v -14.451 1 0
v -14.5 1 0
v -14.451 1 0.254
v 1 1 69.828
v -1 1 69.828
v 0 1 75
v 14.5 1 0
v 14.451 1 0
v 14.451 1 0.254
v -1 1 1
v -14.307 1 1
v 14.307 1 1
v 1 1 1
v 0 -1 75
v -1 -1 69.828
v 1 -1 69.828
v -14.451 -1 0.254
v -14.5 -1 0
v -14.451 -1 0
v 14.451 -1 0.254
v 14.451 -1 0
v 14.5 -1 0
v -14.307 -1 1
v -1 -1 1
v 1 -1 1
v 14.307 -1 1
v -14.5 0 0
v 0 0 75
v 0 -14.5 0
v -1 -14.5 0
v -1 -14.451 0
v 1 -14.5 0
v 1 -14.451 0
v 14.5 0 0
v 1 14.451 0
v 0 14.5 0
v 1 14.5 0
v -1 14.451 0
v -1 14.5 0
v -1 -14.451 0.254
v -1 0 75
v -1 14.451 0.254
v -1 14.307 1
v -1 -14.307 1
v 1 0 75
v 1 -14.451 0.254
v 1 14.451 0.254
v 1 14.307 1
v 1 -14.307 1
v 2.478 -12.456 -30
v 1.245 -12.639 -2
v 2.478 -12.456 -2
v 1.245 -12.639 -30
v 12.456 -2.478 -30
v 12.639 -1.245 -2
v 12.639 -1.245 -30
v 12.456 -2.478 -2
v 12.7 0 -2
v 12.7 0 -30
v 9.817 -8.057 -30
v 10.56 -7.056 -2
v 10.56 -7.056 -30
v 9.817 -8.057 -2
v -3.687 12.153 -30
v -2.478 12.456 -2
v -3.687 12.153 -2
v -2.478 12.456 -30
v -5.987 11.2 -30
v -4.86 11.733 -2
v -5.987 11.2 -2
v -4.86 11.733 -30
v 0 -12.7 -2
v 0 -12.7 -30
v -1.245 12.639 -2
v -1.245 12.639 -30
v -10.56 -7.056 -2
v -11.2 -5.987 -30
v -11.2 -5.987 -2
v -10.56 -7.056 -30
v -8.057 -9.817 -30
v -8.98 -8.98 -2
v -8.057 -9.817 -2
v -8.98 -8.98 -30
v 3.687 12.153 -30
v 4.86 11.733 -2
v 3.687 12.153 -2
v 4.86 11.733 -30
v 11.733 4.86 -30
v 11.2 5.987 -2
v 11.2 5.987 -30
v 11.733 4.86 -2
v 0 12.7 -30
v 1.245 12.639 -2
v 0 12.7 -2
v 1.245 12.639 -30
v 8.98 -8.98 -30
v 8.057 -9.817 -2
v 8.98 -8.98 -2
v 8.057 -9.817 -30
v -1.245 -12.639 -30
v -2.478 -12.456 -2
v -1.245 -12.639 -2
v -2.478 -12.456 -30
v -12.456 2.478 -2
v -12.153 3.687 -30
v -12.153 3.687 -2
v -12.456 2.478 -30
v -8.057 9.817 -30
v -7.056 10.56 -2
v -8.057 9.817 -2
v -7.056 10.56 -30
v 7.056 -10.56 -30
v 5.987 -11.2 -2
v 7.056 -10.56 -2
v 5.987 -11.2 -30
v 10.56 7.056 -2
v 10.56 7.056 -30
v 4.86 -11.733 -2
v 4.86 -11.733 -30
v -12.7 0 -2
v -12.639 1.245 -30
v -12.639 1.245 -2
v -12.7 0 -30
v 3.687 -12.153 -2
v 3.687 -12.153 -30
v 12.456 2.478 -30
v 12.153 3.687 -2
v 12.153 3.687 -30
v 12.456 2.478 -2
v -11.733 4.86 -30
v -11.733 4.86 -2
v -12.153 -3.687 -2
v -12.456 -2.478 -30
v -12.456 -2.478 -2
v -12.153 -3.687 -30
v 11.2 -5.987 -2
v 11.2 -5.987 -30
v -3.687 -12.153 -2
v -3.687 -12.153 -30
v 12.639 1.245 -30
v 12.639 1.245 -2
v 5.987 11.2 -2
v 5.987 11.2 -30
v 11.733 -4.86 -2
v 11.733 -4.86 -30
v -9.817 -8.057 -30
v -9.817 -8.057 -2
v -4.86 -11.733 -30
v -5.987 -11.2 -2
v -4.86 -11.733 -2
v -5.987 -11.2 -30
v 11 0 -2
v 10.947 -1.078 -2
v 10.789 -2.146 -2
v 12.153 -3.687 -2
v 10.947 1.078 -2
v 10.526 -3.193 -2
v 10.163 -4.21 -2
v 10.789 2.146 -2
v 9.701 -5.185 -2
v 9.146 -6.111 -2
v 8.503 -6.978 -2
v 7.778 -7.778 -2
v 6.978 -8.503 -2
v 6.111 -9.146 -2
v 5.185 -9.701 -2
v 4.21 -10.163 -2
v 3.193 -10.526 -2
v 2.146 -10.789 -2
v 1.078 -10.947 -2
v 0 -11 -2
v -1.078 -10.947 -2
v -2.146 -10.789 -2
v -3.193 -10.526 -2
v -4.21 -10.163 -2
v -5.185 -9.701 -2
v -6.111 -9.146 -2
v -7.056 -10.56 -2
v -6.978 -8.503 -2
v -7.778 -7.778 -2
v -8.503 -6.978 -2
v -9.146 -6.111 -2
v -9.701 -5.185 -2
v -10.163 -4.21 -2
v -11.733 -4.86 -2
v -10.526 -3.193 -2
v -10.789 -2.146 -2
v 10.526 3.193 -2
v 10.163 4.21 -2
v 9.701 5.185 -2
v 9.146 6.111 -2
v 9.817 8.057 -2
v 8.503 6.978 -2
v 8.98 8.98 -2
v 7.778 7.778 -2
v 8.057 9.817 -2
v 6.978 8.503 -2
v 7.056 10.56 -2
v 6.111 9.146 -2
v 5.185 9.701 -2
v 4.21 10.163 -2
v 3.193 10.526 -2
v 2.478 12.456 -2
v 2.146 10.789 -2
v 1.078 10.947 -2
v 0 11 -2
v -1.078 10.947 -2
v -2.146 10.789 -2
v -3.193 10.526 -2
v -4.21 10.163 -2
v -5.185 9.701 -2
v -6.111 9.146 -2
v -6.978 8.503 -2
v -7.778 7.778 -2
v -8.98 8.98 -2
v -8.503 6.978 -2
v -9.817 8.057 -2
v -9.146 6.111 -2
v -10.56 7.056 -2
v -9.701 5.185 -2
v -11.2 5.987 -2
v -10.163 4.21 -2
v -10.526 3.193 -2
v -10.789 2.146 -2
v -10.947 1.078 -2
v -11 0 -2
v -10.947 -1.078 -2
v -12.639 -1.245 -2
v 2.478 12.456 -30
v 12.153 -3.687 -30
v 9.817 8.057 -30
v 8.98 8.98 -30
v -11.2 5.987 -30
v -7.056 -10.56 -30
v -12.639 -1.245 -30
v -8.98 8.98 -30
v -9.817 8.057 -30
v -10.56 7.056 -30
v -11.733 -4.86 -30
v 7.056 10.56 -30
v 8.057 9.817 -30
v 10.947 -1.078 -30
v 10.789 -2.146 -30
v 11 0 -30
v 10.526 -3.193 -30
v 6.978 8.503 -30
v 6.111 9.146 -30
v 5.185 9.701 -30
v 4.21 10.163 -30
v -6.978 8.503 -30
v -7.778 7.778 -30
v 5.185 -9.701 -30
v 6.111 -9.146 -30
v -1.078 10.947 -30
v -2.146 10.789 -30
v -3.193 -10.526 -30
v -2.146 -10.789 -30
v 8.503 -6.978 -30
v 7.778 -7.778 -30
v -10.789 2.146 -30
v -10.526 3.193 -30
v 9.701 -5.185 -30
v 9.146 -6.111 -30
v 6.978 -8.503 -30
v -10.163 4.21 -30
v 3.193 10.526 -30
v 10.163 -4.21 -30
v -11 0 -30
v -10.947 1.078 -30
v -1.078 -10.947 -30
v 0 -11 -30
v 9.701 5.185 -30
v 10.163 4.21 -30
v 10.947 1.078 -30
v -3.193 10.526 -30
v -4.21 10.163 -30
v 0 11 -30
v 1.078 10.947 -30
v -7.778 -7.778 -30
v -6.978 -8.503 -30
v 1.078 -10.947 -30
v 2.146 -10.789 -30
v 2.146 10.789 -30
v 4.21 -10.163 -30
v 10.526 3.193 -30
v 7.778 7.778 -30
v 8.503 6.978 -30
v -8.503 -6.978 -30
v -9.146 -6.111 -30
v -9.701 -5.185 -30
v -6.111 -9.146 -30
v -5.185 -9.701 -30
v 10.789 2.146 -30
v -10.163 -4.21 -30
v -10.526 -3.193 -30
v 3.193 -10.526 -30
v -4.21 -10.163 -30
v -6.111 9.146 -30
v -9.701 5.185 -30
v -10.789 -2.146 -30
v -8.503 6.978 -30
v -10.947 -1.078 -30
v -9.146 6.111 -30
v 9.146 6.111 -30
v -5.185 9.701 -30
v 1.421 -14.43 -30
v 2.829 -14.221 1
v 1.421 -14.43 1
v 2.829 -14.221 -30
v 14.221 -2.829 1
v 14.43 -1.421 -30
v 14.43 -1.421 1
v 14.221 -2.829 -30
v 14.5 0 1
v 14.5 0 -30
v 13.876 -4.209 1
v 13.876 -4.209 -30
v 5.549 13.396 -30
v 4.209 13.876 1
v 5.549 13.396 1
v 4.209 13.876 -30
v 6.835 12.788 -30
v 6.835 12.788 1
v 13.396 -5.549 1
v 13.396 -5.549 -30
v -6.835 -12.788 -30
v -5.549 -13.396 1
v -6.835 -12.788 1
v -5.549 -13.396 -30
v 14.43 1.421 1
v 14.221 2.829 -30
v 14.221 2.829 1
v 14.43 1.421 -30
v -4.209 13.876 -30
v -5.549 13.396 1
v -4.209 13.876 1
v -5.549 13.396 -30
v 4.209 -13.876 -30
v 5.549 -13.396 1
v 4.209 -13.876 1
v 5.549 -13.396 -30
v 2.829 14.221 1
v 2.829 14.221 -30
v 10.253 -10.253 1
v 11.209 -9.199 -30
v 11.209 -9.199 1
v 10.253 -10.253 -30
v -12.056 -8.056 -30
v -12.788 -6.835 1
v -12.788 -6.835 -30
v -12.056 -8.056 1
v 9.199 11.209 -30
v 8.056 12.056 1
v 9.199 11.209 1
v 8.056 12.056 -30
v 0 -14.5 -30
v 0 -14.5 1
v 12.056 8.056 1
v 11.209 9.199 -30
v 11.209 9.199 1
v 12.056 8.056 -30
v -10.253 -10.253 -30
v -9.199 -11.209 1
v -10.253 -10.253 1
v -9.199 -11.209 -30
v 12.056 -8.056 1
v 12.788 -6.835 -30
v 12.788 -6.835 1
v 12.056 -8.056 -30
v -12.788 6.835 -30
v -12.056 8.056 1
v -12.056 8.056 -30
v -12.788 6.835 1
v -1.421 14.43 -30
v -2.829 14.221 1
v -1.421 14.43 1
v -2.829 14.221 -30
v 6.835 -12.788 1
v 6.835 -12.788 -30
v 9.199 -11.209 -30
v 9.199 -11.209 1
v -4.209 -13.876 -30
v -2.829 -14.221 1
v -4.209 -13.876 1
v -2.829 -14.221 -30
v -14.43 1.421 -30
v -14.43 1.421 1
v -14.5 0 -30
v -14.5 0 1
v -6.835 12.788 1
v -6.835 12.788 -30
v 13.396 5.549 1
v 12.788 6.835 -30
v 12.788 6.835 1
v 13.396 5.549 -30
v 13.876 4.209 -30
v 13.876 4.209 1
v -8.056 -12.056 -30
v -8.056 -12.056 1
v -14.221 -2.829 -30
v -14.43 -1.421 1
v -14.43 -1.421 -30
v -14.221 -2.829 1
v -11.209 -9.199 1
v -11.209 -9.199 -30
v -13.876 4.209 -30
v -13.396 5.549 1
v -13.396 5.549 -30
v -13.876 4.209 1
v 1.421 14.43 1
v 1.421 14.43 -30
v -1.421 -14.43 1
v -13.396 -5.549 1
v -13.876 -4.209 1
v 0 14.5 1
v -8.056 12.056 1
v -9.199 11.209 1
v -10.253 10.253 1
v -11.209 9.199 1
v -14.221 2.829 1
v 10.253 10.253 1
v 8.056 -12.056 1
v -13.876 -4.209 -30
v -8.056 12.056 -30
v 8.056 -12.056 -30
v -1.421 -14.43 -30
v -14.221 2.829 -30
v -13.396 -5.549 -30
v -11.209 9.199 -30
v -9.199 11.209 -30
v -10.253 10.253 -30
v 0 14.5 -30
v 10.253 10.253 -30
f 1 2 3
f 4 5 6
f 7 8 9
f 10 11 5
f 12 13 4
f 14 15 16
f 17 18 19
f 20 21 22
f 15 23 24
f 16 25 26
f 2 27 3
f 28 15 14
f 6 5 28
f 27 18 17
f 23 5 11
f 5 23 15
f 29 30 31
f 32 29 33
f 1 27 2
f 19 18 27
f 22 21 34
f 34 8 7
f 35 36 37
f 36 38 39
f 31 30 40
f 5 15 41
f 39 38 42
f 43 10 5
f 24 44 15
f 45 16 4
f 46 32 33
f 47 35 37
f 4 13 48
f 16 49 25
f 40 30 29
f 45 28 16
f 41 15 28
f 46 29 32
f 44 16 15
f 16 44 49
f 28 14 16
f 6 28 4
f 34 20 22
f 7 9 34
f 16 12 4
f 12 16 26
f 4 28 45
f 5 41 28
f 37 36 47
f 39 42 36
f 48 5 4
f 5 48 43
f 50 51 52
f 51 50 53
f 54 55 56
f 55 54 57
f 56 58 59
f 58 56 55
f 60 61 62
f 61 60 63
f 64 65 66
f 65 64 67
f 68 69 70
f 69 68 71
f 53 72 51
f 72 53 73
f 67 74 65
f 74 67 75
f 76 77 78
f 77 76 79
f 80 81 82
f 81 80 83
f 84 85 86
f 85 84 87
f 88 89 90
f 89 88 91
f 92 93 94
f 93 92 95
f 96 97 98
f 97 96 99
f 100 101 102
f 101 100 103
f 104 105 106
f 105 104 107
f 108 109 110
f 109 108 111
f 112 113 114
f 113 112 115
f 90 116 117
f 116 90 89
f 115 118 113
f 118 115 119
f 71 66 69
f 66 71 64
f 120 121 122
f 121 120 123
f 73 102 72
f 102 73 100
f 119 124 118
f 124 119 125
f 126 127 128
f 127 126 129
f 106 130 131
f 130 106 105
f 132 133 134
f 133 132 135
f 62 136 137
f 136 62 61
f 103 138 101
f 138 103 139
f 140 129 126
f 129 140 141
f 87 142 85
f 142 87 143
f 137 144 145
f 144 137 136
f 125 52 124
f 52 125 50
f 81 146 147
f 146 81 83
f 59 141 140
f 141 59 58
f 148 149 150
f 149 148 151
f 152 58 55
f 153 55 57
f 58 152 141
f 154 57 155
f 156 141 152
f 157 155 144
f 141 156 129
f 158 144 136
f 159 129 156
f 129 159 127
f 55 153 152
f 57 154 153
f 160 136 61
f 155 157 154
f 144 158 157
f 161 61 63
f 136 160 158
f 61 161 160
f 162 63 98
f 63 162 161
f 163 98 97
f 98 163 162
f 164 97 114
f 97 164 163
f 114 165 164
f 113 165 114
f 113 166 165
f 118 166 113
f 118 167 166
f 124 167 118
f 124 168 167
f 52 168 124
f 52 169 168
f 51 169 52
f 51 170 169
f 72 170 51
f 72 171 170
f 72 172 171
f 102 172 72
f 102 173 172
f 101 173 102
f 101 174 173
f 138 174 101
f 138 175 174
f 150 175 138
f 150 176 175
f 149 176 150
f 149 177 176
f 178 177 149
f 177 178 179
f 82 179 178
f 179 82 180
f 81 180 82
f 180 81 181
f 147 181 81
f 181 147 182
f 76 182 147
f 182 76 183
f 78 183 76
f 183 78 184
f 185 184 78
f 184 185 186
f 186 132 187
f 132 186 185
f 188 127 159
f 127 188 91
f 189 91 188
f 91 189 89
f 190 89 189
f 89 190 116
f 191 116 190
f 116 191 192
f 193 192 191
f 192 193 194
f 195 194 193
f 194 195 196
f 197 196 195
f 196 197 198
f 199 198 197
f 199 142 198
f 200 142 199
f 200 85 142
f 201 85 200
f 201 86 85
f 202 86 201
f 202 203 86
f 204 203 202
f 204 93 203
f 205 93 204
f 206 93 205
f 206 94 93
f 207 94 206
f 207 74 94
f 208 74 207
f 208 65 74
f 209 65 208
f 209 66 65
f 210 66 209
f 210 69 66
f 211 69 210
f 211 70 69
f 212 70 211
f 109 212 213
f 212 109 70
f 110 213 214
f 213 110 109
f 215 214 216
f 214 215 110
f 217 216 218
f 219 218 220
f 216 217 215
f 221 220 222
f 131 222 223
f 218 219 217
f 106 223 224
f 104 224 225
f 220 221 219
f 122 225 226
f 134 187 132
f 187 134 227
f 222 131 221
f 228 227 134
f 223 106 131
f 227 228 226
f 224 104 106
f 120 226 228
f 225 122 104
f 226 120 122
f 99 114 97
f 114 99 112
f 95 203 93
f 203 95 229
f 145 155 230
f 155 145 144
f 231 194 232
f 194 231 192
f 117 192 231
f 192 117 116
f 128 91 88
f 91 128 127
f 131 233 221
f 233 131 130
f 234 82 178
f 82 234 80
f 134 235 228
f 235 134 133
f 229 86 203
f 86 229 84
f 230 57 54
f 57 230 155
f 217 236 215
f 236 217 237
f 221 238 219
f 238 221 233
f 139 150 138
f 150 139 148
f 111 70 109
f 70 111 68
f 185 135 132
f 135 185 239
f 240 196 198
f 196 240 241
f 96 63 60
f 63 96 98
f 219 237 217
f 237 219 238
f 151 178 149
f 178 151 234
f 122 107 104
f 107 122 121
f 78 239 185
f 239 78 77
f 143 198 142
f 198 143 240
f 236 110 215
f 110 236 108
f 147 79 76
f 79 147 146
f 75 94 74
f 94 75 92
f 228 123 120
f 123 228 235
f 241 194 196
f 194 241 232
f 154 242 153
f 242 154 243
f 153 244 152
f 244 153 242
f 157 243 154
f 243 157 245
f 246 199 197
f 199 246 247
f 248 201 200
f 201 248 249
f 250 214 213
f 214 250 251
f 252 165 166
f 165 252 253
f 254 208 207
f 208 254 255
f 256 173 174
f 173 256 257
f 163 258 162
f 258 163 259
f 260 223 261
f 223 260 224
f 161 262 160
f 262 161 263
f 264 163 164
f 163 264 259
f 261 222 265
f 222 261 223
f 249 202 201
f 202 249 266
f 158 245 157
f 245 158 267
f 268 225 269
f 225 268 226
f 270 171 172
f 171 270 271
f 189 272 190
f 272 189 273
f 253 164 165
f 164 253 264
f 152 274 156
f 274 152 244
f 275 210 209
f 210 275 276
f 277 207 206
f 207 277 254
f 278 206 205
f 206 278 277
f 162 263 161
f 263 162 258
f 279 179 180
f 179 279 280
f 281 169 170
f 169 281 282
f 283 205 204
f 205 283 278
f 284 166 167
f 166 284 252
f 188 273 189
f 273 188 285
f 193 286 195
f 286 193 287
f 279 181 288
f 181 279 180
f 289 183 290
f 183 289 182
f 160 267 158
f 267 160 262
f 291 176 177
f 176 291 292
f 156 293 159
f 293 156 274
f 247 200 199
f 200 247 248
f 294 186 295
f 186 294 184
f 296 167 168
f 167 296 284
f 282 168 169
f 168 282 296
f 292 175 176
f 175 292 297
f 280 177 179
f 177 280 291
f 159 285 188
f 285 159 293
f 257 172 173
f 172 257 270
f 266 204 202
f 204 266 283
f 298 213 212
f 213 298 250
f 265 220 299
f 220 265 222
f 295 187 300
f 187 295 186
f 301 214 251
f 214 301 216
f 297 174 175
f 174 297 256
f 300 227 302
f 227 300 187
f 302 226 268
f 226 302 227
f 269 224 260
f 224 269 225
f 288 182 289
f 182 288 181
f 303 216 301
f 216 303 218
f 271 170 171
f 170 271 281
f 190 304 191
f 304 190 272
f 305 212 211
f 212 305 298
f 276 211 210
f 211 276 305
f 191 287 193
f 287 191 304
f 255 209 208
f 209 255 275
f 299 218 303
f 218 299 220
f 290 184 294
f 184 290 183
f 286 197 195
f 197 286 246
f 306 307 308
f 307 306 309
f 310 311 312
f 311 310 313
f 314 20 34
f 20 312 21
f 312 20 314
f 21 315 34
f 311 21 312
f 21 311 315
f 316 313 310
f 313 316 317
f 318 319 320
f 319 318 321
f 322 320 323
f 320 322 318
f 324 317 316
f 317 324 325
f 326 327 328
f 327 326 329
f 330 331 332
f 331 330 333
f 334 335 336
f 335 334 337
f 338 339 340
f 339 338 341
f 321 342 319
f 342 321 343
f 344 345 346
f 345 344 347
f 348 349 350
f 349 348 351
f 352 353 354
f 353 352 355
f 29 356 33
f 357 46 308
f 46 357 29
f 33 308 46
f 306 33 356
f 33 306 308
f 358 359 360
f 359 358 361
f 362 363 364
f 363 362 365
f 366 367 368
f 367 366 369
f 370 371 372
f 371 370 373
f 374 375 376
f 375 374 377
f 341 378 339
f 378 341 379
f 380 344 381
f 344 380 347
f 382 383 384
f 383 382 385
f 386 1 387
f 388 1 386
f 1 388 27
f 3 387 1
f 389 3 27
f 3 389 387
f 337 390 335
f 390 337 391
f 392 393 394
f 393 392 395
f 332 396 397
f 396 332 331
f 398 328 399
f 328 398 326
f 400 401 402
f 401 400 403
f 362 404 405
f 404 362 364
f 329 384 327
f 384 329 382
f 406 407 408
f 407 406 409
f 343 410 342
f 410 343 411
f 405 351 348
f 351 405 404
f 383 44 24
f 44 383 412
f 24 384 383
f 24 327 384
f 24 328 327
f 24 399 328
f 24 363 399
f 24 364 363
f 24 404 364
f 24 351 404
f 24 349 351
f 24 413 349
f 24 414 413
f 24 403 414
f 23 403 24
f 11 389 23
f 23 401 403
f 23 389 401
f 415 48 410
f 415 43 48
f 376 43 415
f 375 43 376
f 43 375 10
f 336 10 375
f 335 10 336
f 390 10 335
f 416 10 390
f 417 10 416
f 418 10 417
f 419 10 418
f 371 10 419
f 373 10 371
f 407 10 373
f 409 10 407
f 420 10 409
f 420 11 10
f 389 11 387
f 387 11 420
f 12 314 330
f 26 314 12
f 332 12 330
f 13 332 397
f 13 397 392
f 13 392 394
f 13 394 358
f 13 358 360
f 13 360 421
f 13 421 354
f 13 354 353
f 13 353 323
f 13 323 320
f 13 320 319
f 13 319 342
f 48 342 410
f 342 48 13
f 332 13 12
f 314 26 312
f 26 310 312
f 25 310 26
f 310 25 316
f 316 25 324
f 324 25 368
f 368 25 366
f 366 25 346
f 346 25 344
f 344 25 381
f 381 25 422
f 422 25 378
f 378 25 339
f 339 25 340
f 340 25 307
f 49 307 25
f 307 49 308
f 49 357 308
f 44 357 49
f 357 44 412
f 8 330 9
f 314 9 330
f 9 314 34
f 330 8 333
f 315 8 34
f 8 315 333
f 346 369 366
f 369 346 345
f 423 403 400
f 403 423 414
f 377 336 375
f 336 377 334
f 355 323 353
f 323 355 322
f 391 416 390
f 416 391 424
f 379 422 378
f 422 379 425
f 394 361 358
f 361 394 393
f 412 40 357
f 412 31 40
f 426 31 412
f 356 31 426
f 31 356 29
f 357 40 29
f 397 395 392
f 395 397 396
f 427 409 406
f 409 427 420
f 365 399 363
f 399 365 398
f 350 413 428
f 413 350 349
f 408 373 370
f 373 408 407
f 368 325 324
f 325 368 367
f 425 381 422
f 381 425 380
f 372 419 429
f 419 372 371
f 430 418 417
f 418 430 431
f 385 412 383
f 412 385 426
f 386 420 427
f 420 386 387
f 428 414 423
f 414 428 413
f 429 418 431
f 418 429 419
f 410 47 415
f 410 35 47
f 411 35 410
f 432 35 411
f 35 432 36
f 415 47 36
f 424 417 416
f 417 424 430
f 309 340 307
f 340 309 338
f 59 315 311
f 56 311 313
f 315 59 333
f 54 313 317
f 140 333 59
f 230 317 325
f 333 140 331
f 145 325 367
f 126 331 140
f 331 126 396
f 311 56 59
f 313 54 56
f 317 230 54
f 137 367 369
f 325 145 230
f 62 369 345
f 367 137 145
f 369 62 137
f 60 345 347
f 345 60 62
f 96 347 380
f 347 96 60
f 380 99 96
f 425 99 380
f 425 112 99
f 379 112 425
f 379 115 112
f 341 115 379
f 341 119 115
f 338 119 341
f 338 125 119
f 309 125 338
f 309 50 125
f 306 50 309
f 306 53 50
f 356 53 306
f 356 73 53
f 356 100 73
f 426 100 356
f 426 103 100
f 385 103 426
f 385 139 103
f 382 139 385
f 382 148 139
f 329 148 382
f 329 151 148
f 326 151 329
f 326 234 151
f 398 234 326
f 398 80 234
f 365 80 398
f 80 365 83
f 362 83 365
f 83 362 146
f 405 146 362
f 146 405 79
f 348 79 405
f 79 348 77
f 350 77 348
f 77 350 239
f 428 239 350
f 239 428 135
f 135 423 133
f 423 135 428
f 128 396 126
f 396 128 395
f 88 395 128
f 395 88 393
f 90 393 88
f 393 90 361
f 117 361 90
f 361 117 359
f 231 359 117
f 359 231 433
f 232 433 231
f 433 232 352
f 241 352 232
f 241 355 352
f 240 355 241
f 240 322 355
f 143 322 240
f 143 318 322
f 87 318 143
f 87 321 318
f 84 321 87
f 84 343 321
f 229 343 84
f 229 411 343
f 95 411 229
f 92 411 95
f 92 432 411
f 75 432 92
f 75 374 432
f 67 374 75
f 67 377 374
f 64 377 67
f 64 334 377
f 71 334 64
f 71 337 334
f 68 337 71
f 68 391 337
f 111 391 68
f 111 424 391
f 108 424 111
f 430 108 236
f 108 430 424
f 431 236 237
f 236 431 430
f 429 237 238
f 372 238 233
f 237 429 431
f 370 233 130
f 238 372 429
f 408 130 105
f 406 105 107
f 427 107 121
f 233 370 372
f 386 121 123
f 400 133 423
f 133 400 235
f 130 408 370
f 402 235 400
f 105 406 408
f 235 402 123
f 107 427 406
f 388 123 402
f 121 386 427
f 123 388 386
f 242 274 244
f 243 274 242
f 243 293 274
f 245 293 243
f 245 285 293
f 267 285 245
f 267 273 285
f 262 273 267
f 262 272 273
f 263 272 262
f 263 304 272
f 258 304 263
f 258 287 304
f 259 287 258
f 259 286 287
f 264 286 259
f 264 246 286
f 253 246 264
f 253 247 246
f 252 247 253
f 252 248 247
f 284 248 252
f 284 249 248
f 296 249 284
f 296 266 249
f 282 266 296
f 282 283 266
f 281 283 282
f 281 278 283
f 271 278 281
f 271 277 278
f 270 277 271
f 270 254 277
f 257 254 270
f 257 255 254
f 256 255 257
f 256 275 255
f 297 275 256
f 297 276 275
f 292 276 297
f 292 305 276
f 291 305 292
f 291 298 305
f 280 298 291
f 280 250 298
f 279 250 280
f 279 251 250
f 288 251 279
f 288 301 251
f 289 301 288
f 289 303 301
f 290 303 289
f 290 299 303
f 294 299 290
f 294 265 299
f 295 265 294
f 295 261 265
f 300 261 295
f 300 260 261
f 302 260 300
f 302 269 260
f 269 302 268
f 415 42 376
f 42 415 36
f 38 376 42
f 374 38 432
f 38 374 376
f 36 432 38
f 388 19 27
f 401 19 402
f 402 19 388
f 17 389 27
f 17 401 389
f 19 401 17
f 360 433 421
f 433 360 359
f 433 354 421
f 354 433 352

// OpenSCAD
// file: ../lightstake/stakethread.scad
use <../threads/isothreads.scad>

$fa = 1;
$fs = 0.4;

module stakethread(depth=10) {

// Inner diameter 15.8
// Outer diameter 18.5
// Depth 10.0
// Number of threads 6


// ----------------------------------------------------------------------------
// diameter -    outside diameter of threads in mm. Default: 8.
// pitch    -    thread axial "travel" per turn in mm.  Default: 1.
// length   -    overall axial length of thread in mm.  Default: 1.
// internal -    true = clearances for internal thread (e.g., a nut).../threads/isothreads
//               false = clearances for external thread (e.g., a bolt).
//               (Internal threads should be "cut out" from a solid using
//               difference ()).
// n_starts -    Number of thread starts (e.g., DNA, a "double helix," has
//               n_starts=2).  See wikipedia Screw_thread.
// thread_size - (non-standard) axial width of a single thread "V" - independent
//               of pitch.  Default: same as pitch.
// groove      - (non-standard) subtract inverted "V" from cylinder (rather than
//               add protruding "V" to cylinder).
// square      - Square threads (per
//               https://en.wikipedia.org/wiki/Square_thread_form).
// rectangle   - (non-standard) "Rectangular" thread - ratio depth/(axial) width
//               Default: 1 (square).
// angle       - (non-standard) angle (deg) of thread side from perpendicular to
//               axis (default = standard = 30 degrees).
// taper       - diameter change per length (National Pipe Thread/ANSI B1.20.1
//               is 1" diameter per 16" length). Taper decreases from 'diameter'
//               as z increases.
// leadin      - 1 (default): chamfer (45 degree) at max-z end; 0: no chamfer;
//               2: chamfer at both ends, 3: chamfer at z=0 end.
// leadfac     - scale of leadin chamfer (default: 1.0 = 1/2 thread).
    metric_thread (diameter=17, pitch=1.67, length=depth, internal=false, n_starts=1,
                      thread_size=-1, groove=false, square=false, rectangle=0,
                      angle=30, taper=0, leadin=1, leadfac=1.0);
                      
}  

stakethread(15);
// file: sleeve.scad
// model the candy cane tube
module tube(height=5)
{
  difference()
  {
    cylinder(h=height, d=25.4, center=true, $fn=64);
    cylinder(h=height, d=22, center=true, $fn=64);
  }
}

module sleeve(depth=5, sleeve_d=29)
{
  floor_thickness = 2;
  difference()
  {
    cylinder(d=sleeve_d,h=depth+floor_thickness, center=true, $fn=64);
    translate([0,0,floor_thickness])tube(depth);
  }
}

sleeve();
// file: ../lightstake/stake.scad
use <stakethread.scad>

$fa = 1;
$fs = 0.4;

module blade(h=100,b=10,w=2) {
    rotate(a=[90,-90,0])
    linear_extrude(height = w, center = true, convexity = 10, twist = 0)
    polygon(points=[[0,0],[h,0],[0,b]], paths=[[0,1,2]]);
}

module stake(h=100,b=10,w=2) {
    blade(h,b,w);
    rotate([0,0,90]) blade(h,b,w);
    rotate([0,0,180]) blade(h,b,w);
    rotate([0,0,270]) blade(h,b,w);
}

thread_depth=10;
disk_depth = 3;
disk_radius = 14;

stakethread(thread_depth);
translate([0,0,thread_depth]) cylinder(r=disk_radius,h=disk_depth);
translate([0,0,thread_depth+disk_depth]) stake(100,disk_radius,2);
// main file
use <../lightstake/stake.scad>
use <sleeve.scad>

sleeve_d=29;
sleeve_h=29;

stake(h=75,b=sleeve_d/2, w=2);
translate([0,0,-sleeve_h/2])rotate([180,0,0])sleeve(sleeve_h, sleeve_d);
